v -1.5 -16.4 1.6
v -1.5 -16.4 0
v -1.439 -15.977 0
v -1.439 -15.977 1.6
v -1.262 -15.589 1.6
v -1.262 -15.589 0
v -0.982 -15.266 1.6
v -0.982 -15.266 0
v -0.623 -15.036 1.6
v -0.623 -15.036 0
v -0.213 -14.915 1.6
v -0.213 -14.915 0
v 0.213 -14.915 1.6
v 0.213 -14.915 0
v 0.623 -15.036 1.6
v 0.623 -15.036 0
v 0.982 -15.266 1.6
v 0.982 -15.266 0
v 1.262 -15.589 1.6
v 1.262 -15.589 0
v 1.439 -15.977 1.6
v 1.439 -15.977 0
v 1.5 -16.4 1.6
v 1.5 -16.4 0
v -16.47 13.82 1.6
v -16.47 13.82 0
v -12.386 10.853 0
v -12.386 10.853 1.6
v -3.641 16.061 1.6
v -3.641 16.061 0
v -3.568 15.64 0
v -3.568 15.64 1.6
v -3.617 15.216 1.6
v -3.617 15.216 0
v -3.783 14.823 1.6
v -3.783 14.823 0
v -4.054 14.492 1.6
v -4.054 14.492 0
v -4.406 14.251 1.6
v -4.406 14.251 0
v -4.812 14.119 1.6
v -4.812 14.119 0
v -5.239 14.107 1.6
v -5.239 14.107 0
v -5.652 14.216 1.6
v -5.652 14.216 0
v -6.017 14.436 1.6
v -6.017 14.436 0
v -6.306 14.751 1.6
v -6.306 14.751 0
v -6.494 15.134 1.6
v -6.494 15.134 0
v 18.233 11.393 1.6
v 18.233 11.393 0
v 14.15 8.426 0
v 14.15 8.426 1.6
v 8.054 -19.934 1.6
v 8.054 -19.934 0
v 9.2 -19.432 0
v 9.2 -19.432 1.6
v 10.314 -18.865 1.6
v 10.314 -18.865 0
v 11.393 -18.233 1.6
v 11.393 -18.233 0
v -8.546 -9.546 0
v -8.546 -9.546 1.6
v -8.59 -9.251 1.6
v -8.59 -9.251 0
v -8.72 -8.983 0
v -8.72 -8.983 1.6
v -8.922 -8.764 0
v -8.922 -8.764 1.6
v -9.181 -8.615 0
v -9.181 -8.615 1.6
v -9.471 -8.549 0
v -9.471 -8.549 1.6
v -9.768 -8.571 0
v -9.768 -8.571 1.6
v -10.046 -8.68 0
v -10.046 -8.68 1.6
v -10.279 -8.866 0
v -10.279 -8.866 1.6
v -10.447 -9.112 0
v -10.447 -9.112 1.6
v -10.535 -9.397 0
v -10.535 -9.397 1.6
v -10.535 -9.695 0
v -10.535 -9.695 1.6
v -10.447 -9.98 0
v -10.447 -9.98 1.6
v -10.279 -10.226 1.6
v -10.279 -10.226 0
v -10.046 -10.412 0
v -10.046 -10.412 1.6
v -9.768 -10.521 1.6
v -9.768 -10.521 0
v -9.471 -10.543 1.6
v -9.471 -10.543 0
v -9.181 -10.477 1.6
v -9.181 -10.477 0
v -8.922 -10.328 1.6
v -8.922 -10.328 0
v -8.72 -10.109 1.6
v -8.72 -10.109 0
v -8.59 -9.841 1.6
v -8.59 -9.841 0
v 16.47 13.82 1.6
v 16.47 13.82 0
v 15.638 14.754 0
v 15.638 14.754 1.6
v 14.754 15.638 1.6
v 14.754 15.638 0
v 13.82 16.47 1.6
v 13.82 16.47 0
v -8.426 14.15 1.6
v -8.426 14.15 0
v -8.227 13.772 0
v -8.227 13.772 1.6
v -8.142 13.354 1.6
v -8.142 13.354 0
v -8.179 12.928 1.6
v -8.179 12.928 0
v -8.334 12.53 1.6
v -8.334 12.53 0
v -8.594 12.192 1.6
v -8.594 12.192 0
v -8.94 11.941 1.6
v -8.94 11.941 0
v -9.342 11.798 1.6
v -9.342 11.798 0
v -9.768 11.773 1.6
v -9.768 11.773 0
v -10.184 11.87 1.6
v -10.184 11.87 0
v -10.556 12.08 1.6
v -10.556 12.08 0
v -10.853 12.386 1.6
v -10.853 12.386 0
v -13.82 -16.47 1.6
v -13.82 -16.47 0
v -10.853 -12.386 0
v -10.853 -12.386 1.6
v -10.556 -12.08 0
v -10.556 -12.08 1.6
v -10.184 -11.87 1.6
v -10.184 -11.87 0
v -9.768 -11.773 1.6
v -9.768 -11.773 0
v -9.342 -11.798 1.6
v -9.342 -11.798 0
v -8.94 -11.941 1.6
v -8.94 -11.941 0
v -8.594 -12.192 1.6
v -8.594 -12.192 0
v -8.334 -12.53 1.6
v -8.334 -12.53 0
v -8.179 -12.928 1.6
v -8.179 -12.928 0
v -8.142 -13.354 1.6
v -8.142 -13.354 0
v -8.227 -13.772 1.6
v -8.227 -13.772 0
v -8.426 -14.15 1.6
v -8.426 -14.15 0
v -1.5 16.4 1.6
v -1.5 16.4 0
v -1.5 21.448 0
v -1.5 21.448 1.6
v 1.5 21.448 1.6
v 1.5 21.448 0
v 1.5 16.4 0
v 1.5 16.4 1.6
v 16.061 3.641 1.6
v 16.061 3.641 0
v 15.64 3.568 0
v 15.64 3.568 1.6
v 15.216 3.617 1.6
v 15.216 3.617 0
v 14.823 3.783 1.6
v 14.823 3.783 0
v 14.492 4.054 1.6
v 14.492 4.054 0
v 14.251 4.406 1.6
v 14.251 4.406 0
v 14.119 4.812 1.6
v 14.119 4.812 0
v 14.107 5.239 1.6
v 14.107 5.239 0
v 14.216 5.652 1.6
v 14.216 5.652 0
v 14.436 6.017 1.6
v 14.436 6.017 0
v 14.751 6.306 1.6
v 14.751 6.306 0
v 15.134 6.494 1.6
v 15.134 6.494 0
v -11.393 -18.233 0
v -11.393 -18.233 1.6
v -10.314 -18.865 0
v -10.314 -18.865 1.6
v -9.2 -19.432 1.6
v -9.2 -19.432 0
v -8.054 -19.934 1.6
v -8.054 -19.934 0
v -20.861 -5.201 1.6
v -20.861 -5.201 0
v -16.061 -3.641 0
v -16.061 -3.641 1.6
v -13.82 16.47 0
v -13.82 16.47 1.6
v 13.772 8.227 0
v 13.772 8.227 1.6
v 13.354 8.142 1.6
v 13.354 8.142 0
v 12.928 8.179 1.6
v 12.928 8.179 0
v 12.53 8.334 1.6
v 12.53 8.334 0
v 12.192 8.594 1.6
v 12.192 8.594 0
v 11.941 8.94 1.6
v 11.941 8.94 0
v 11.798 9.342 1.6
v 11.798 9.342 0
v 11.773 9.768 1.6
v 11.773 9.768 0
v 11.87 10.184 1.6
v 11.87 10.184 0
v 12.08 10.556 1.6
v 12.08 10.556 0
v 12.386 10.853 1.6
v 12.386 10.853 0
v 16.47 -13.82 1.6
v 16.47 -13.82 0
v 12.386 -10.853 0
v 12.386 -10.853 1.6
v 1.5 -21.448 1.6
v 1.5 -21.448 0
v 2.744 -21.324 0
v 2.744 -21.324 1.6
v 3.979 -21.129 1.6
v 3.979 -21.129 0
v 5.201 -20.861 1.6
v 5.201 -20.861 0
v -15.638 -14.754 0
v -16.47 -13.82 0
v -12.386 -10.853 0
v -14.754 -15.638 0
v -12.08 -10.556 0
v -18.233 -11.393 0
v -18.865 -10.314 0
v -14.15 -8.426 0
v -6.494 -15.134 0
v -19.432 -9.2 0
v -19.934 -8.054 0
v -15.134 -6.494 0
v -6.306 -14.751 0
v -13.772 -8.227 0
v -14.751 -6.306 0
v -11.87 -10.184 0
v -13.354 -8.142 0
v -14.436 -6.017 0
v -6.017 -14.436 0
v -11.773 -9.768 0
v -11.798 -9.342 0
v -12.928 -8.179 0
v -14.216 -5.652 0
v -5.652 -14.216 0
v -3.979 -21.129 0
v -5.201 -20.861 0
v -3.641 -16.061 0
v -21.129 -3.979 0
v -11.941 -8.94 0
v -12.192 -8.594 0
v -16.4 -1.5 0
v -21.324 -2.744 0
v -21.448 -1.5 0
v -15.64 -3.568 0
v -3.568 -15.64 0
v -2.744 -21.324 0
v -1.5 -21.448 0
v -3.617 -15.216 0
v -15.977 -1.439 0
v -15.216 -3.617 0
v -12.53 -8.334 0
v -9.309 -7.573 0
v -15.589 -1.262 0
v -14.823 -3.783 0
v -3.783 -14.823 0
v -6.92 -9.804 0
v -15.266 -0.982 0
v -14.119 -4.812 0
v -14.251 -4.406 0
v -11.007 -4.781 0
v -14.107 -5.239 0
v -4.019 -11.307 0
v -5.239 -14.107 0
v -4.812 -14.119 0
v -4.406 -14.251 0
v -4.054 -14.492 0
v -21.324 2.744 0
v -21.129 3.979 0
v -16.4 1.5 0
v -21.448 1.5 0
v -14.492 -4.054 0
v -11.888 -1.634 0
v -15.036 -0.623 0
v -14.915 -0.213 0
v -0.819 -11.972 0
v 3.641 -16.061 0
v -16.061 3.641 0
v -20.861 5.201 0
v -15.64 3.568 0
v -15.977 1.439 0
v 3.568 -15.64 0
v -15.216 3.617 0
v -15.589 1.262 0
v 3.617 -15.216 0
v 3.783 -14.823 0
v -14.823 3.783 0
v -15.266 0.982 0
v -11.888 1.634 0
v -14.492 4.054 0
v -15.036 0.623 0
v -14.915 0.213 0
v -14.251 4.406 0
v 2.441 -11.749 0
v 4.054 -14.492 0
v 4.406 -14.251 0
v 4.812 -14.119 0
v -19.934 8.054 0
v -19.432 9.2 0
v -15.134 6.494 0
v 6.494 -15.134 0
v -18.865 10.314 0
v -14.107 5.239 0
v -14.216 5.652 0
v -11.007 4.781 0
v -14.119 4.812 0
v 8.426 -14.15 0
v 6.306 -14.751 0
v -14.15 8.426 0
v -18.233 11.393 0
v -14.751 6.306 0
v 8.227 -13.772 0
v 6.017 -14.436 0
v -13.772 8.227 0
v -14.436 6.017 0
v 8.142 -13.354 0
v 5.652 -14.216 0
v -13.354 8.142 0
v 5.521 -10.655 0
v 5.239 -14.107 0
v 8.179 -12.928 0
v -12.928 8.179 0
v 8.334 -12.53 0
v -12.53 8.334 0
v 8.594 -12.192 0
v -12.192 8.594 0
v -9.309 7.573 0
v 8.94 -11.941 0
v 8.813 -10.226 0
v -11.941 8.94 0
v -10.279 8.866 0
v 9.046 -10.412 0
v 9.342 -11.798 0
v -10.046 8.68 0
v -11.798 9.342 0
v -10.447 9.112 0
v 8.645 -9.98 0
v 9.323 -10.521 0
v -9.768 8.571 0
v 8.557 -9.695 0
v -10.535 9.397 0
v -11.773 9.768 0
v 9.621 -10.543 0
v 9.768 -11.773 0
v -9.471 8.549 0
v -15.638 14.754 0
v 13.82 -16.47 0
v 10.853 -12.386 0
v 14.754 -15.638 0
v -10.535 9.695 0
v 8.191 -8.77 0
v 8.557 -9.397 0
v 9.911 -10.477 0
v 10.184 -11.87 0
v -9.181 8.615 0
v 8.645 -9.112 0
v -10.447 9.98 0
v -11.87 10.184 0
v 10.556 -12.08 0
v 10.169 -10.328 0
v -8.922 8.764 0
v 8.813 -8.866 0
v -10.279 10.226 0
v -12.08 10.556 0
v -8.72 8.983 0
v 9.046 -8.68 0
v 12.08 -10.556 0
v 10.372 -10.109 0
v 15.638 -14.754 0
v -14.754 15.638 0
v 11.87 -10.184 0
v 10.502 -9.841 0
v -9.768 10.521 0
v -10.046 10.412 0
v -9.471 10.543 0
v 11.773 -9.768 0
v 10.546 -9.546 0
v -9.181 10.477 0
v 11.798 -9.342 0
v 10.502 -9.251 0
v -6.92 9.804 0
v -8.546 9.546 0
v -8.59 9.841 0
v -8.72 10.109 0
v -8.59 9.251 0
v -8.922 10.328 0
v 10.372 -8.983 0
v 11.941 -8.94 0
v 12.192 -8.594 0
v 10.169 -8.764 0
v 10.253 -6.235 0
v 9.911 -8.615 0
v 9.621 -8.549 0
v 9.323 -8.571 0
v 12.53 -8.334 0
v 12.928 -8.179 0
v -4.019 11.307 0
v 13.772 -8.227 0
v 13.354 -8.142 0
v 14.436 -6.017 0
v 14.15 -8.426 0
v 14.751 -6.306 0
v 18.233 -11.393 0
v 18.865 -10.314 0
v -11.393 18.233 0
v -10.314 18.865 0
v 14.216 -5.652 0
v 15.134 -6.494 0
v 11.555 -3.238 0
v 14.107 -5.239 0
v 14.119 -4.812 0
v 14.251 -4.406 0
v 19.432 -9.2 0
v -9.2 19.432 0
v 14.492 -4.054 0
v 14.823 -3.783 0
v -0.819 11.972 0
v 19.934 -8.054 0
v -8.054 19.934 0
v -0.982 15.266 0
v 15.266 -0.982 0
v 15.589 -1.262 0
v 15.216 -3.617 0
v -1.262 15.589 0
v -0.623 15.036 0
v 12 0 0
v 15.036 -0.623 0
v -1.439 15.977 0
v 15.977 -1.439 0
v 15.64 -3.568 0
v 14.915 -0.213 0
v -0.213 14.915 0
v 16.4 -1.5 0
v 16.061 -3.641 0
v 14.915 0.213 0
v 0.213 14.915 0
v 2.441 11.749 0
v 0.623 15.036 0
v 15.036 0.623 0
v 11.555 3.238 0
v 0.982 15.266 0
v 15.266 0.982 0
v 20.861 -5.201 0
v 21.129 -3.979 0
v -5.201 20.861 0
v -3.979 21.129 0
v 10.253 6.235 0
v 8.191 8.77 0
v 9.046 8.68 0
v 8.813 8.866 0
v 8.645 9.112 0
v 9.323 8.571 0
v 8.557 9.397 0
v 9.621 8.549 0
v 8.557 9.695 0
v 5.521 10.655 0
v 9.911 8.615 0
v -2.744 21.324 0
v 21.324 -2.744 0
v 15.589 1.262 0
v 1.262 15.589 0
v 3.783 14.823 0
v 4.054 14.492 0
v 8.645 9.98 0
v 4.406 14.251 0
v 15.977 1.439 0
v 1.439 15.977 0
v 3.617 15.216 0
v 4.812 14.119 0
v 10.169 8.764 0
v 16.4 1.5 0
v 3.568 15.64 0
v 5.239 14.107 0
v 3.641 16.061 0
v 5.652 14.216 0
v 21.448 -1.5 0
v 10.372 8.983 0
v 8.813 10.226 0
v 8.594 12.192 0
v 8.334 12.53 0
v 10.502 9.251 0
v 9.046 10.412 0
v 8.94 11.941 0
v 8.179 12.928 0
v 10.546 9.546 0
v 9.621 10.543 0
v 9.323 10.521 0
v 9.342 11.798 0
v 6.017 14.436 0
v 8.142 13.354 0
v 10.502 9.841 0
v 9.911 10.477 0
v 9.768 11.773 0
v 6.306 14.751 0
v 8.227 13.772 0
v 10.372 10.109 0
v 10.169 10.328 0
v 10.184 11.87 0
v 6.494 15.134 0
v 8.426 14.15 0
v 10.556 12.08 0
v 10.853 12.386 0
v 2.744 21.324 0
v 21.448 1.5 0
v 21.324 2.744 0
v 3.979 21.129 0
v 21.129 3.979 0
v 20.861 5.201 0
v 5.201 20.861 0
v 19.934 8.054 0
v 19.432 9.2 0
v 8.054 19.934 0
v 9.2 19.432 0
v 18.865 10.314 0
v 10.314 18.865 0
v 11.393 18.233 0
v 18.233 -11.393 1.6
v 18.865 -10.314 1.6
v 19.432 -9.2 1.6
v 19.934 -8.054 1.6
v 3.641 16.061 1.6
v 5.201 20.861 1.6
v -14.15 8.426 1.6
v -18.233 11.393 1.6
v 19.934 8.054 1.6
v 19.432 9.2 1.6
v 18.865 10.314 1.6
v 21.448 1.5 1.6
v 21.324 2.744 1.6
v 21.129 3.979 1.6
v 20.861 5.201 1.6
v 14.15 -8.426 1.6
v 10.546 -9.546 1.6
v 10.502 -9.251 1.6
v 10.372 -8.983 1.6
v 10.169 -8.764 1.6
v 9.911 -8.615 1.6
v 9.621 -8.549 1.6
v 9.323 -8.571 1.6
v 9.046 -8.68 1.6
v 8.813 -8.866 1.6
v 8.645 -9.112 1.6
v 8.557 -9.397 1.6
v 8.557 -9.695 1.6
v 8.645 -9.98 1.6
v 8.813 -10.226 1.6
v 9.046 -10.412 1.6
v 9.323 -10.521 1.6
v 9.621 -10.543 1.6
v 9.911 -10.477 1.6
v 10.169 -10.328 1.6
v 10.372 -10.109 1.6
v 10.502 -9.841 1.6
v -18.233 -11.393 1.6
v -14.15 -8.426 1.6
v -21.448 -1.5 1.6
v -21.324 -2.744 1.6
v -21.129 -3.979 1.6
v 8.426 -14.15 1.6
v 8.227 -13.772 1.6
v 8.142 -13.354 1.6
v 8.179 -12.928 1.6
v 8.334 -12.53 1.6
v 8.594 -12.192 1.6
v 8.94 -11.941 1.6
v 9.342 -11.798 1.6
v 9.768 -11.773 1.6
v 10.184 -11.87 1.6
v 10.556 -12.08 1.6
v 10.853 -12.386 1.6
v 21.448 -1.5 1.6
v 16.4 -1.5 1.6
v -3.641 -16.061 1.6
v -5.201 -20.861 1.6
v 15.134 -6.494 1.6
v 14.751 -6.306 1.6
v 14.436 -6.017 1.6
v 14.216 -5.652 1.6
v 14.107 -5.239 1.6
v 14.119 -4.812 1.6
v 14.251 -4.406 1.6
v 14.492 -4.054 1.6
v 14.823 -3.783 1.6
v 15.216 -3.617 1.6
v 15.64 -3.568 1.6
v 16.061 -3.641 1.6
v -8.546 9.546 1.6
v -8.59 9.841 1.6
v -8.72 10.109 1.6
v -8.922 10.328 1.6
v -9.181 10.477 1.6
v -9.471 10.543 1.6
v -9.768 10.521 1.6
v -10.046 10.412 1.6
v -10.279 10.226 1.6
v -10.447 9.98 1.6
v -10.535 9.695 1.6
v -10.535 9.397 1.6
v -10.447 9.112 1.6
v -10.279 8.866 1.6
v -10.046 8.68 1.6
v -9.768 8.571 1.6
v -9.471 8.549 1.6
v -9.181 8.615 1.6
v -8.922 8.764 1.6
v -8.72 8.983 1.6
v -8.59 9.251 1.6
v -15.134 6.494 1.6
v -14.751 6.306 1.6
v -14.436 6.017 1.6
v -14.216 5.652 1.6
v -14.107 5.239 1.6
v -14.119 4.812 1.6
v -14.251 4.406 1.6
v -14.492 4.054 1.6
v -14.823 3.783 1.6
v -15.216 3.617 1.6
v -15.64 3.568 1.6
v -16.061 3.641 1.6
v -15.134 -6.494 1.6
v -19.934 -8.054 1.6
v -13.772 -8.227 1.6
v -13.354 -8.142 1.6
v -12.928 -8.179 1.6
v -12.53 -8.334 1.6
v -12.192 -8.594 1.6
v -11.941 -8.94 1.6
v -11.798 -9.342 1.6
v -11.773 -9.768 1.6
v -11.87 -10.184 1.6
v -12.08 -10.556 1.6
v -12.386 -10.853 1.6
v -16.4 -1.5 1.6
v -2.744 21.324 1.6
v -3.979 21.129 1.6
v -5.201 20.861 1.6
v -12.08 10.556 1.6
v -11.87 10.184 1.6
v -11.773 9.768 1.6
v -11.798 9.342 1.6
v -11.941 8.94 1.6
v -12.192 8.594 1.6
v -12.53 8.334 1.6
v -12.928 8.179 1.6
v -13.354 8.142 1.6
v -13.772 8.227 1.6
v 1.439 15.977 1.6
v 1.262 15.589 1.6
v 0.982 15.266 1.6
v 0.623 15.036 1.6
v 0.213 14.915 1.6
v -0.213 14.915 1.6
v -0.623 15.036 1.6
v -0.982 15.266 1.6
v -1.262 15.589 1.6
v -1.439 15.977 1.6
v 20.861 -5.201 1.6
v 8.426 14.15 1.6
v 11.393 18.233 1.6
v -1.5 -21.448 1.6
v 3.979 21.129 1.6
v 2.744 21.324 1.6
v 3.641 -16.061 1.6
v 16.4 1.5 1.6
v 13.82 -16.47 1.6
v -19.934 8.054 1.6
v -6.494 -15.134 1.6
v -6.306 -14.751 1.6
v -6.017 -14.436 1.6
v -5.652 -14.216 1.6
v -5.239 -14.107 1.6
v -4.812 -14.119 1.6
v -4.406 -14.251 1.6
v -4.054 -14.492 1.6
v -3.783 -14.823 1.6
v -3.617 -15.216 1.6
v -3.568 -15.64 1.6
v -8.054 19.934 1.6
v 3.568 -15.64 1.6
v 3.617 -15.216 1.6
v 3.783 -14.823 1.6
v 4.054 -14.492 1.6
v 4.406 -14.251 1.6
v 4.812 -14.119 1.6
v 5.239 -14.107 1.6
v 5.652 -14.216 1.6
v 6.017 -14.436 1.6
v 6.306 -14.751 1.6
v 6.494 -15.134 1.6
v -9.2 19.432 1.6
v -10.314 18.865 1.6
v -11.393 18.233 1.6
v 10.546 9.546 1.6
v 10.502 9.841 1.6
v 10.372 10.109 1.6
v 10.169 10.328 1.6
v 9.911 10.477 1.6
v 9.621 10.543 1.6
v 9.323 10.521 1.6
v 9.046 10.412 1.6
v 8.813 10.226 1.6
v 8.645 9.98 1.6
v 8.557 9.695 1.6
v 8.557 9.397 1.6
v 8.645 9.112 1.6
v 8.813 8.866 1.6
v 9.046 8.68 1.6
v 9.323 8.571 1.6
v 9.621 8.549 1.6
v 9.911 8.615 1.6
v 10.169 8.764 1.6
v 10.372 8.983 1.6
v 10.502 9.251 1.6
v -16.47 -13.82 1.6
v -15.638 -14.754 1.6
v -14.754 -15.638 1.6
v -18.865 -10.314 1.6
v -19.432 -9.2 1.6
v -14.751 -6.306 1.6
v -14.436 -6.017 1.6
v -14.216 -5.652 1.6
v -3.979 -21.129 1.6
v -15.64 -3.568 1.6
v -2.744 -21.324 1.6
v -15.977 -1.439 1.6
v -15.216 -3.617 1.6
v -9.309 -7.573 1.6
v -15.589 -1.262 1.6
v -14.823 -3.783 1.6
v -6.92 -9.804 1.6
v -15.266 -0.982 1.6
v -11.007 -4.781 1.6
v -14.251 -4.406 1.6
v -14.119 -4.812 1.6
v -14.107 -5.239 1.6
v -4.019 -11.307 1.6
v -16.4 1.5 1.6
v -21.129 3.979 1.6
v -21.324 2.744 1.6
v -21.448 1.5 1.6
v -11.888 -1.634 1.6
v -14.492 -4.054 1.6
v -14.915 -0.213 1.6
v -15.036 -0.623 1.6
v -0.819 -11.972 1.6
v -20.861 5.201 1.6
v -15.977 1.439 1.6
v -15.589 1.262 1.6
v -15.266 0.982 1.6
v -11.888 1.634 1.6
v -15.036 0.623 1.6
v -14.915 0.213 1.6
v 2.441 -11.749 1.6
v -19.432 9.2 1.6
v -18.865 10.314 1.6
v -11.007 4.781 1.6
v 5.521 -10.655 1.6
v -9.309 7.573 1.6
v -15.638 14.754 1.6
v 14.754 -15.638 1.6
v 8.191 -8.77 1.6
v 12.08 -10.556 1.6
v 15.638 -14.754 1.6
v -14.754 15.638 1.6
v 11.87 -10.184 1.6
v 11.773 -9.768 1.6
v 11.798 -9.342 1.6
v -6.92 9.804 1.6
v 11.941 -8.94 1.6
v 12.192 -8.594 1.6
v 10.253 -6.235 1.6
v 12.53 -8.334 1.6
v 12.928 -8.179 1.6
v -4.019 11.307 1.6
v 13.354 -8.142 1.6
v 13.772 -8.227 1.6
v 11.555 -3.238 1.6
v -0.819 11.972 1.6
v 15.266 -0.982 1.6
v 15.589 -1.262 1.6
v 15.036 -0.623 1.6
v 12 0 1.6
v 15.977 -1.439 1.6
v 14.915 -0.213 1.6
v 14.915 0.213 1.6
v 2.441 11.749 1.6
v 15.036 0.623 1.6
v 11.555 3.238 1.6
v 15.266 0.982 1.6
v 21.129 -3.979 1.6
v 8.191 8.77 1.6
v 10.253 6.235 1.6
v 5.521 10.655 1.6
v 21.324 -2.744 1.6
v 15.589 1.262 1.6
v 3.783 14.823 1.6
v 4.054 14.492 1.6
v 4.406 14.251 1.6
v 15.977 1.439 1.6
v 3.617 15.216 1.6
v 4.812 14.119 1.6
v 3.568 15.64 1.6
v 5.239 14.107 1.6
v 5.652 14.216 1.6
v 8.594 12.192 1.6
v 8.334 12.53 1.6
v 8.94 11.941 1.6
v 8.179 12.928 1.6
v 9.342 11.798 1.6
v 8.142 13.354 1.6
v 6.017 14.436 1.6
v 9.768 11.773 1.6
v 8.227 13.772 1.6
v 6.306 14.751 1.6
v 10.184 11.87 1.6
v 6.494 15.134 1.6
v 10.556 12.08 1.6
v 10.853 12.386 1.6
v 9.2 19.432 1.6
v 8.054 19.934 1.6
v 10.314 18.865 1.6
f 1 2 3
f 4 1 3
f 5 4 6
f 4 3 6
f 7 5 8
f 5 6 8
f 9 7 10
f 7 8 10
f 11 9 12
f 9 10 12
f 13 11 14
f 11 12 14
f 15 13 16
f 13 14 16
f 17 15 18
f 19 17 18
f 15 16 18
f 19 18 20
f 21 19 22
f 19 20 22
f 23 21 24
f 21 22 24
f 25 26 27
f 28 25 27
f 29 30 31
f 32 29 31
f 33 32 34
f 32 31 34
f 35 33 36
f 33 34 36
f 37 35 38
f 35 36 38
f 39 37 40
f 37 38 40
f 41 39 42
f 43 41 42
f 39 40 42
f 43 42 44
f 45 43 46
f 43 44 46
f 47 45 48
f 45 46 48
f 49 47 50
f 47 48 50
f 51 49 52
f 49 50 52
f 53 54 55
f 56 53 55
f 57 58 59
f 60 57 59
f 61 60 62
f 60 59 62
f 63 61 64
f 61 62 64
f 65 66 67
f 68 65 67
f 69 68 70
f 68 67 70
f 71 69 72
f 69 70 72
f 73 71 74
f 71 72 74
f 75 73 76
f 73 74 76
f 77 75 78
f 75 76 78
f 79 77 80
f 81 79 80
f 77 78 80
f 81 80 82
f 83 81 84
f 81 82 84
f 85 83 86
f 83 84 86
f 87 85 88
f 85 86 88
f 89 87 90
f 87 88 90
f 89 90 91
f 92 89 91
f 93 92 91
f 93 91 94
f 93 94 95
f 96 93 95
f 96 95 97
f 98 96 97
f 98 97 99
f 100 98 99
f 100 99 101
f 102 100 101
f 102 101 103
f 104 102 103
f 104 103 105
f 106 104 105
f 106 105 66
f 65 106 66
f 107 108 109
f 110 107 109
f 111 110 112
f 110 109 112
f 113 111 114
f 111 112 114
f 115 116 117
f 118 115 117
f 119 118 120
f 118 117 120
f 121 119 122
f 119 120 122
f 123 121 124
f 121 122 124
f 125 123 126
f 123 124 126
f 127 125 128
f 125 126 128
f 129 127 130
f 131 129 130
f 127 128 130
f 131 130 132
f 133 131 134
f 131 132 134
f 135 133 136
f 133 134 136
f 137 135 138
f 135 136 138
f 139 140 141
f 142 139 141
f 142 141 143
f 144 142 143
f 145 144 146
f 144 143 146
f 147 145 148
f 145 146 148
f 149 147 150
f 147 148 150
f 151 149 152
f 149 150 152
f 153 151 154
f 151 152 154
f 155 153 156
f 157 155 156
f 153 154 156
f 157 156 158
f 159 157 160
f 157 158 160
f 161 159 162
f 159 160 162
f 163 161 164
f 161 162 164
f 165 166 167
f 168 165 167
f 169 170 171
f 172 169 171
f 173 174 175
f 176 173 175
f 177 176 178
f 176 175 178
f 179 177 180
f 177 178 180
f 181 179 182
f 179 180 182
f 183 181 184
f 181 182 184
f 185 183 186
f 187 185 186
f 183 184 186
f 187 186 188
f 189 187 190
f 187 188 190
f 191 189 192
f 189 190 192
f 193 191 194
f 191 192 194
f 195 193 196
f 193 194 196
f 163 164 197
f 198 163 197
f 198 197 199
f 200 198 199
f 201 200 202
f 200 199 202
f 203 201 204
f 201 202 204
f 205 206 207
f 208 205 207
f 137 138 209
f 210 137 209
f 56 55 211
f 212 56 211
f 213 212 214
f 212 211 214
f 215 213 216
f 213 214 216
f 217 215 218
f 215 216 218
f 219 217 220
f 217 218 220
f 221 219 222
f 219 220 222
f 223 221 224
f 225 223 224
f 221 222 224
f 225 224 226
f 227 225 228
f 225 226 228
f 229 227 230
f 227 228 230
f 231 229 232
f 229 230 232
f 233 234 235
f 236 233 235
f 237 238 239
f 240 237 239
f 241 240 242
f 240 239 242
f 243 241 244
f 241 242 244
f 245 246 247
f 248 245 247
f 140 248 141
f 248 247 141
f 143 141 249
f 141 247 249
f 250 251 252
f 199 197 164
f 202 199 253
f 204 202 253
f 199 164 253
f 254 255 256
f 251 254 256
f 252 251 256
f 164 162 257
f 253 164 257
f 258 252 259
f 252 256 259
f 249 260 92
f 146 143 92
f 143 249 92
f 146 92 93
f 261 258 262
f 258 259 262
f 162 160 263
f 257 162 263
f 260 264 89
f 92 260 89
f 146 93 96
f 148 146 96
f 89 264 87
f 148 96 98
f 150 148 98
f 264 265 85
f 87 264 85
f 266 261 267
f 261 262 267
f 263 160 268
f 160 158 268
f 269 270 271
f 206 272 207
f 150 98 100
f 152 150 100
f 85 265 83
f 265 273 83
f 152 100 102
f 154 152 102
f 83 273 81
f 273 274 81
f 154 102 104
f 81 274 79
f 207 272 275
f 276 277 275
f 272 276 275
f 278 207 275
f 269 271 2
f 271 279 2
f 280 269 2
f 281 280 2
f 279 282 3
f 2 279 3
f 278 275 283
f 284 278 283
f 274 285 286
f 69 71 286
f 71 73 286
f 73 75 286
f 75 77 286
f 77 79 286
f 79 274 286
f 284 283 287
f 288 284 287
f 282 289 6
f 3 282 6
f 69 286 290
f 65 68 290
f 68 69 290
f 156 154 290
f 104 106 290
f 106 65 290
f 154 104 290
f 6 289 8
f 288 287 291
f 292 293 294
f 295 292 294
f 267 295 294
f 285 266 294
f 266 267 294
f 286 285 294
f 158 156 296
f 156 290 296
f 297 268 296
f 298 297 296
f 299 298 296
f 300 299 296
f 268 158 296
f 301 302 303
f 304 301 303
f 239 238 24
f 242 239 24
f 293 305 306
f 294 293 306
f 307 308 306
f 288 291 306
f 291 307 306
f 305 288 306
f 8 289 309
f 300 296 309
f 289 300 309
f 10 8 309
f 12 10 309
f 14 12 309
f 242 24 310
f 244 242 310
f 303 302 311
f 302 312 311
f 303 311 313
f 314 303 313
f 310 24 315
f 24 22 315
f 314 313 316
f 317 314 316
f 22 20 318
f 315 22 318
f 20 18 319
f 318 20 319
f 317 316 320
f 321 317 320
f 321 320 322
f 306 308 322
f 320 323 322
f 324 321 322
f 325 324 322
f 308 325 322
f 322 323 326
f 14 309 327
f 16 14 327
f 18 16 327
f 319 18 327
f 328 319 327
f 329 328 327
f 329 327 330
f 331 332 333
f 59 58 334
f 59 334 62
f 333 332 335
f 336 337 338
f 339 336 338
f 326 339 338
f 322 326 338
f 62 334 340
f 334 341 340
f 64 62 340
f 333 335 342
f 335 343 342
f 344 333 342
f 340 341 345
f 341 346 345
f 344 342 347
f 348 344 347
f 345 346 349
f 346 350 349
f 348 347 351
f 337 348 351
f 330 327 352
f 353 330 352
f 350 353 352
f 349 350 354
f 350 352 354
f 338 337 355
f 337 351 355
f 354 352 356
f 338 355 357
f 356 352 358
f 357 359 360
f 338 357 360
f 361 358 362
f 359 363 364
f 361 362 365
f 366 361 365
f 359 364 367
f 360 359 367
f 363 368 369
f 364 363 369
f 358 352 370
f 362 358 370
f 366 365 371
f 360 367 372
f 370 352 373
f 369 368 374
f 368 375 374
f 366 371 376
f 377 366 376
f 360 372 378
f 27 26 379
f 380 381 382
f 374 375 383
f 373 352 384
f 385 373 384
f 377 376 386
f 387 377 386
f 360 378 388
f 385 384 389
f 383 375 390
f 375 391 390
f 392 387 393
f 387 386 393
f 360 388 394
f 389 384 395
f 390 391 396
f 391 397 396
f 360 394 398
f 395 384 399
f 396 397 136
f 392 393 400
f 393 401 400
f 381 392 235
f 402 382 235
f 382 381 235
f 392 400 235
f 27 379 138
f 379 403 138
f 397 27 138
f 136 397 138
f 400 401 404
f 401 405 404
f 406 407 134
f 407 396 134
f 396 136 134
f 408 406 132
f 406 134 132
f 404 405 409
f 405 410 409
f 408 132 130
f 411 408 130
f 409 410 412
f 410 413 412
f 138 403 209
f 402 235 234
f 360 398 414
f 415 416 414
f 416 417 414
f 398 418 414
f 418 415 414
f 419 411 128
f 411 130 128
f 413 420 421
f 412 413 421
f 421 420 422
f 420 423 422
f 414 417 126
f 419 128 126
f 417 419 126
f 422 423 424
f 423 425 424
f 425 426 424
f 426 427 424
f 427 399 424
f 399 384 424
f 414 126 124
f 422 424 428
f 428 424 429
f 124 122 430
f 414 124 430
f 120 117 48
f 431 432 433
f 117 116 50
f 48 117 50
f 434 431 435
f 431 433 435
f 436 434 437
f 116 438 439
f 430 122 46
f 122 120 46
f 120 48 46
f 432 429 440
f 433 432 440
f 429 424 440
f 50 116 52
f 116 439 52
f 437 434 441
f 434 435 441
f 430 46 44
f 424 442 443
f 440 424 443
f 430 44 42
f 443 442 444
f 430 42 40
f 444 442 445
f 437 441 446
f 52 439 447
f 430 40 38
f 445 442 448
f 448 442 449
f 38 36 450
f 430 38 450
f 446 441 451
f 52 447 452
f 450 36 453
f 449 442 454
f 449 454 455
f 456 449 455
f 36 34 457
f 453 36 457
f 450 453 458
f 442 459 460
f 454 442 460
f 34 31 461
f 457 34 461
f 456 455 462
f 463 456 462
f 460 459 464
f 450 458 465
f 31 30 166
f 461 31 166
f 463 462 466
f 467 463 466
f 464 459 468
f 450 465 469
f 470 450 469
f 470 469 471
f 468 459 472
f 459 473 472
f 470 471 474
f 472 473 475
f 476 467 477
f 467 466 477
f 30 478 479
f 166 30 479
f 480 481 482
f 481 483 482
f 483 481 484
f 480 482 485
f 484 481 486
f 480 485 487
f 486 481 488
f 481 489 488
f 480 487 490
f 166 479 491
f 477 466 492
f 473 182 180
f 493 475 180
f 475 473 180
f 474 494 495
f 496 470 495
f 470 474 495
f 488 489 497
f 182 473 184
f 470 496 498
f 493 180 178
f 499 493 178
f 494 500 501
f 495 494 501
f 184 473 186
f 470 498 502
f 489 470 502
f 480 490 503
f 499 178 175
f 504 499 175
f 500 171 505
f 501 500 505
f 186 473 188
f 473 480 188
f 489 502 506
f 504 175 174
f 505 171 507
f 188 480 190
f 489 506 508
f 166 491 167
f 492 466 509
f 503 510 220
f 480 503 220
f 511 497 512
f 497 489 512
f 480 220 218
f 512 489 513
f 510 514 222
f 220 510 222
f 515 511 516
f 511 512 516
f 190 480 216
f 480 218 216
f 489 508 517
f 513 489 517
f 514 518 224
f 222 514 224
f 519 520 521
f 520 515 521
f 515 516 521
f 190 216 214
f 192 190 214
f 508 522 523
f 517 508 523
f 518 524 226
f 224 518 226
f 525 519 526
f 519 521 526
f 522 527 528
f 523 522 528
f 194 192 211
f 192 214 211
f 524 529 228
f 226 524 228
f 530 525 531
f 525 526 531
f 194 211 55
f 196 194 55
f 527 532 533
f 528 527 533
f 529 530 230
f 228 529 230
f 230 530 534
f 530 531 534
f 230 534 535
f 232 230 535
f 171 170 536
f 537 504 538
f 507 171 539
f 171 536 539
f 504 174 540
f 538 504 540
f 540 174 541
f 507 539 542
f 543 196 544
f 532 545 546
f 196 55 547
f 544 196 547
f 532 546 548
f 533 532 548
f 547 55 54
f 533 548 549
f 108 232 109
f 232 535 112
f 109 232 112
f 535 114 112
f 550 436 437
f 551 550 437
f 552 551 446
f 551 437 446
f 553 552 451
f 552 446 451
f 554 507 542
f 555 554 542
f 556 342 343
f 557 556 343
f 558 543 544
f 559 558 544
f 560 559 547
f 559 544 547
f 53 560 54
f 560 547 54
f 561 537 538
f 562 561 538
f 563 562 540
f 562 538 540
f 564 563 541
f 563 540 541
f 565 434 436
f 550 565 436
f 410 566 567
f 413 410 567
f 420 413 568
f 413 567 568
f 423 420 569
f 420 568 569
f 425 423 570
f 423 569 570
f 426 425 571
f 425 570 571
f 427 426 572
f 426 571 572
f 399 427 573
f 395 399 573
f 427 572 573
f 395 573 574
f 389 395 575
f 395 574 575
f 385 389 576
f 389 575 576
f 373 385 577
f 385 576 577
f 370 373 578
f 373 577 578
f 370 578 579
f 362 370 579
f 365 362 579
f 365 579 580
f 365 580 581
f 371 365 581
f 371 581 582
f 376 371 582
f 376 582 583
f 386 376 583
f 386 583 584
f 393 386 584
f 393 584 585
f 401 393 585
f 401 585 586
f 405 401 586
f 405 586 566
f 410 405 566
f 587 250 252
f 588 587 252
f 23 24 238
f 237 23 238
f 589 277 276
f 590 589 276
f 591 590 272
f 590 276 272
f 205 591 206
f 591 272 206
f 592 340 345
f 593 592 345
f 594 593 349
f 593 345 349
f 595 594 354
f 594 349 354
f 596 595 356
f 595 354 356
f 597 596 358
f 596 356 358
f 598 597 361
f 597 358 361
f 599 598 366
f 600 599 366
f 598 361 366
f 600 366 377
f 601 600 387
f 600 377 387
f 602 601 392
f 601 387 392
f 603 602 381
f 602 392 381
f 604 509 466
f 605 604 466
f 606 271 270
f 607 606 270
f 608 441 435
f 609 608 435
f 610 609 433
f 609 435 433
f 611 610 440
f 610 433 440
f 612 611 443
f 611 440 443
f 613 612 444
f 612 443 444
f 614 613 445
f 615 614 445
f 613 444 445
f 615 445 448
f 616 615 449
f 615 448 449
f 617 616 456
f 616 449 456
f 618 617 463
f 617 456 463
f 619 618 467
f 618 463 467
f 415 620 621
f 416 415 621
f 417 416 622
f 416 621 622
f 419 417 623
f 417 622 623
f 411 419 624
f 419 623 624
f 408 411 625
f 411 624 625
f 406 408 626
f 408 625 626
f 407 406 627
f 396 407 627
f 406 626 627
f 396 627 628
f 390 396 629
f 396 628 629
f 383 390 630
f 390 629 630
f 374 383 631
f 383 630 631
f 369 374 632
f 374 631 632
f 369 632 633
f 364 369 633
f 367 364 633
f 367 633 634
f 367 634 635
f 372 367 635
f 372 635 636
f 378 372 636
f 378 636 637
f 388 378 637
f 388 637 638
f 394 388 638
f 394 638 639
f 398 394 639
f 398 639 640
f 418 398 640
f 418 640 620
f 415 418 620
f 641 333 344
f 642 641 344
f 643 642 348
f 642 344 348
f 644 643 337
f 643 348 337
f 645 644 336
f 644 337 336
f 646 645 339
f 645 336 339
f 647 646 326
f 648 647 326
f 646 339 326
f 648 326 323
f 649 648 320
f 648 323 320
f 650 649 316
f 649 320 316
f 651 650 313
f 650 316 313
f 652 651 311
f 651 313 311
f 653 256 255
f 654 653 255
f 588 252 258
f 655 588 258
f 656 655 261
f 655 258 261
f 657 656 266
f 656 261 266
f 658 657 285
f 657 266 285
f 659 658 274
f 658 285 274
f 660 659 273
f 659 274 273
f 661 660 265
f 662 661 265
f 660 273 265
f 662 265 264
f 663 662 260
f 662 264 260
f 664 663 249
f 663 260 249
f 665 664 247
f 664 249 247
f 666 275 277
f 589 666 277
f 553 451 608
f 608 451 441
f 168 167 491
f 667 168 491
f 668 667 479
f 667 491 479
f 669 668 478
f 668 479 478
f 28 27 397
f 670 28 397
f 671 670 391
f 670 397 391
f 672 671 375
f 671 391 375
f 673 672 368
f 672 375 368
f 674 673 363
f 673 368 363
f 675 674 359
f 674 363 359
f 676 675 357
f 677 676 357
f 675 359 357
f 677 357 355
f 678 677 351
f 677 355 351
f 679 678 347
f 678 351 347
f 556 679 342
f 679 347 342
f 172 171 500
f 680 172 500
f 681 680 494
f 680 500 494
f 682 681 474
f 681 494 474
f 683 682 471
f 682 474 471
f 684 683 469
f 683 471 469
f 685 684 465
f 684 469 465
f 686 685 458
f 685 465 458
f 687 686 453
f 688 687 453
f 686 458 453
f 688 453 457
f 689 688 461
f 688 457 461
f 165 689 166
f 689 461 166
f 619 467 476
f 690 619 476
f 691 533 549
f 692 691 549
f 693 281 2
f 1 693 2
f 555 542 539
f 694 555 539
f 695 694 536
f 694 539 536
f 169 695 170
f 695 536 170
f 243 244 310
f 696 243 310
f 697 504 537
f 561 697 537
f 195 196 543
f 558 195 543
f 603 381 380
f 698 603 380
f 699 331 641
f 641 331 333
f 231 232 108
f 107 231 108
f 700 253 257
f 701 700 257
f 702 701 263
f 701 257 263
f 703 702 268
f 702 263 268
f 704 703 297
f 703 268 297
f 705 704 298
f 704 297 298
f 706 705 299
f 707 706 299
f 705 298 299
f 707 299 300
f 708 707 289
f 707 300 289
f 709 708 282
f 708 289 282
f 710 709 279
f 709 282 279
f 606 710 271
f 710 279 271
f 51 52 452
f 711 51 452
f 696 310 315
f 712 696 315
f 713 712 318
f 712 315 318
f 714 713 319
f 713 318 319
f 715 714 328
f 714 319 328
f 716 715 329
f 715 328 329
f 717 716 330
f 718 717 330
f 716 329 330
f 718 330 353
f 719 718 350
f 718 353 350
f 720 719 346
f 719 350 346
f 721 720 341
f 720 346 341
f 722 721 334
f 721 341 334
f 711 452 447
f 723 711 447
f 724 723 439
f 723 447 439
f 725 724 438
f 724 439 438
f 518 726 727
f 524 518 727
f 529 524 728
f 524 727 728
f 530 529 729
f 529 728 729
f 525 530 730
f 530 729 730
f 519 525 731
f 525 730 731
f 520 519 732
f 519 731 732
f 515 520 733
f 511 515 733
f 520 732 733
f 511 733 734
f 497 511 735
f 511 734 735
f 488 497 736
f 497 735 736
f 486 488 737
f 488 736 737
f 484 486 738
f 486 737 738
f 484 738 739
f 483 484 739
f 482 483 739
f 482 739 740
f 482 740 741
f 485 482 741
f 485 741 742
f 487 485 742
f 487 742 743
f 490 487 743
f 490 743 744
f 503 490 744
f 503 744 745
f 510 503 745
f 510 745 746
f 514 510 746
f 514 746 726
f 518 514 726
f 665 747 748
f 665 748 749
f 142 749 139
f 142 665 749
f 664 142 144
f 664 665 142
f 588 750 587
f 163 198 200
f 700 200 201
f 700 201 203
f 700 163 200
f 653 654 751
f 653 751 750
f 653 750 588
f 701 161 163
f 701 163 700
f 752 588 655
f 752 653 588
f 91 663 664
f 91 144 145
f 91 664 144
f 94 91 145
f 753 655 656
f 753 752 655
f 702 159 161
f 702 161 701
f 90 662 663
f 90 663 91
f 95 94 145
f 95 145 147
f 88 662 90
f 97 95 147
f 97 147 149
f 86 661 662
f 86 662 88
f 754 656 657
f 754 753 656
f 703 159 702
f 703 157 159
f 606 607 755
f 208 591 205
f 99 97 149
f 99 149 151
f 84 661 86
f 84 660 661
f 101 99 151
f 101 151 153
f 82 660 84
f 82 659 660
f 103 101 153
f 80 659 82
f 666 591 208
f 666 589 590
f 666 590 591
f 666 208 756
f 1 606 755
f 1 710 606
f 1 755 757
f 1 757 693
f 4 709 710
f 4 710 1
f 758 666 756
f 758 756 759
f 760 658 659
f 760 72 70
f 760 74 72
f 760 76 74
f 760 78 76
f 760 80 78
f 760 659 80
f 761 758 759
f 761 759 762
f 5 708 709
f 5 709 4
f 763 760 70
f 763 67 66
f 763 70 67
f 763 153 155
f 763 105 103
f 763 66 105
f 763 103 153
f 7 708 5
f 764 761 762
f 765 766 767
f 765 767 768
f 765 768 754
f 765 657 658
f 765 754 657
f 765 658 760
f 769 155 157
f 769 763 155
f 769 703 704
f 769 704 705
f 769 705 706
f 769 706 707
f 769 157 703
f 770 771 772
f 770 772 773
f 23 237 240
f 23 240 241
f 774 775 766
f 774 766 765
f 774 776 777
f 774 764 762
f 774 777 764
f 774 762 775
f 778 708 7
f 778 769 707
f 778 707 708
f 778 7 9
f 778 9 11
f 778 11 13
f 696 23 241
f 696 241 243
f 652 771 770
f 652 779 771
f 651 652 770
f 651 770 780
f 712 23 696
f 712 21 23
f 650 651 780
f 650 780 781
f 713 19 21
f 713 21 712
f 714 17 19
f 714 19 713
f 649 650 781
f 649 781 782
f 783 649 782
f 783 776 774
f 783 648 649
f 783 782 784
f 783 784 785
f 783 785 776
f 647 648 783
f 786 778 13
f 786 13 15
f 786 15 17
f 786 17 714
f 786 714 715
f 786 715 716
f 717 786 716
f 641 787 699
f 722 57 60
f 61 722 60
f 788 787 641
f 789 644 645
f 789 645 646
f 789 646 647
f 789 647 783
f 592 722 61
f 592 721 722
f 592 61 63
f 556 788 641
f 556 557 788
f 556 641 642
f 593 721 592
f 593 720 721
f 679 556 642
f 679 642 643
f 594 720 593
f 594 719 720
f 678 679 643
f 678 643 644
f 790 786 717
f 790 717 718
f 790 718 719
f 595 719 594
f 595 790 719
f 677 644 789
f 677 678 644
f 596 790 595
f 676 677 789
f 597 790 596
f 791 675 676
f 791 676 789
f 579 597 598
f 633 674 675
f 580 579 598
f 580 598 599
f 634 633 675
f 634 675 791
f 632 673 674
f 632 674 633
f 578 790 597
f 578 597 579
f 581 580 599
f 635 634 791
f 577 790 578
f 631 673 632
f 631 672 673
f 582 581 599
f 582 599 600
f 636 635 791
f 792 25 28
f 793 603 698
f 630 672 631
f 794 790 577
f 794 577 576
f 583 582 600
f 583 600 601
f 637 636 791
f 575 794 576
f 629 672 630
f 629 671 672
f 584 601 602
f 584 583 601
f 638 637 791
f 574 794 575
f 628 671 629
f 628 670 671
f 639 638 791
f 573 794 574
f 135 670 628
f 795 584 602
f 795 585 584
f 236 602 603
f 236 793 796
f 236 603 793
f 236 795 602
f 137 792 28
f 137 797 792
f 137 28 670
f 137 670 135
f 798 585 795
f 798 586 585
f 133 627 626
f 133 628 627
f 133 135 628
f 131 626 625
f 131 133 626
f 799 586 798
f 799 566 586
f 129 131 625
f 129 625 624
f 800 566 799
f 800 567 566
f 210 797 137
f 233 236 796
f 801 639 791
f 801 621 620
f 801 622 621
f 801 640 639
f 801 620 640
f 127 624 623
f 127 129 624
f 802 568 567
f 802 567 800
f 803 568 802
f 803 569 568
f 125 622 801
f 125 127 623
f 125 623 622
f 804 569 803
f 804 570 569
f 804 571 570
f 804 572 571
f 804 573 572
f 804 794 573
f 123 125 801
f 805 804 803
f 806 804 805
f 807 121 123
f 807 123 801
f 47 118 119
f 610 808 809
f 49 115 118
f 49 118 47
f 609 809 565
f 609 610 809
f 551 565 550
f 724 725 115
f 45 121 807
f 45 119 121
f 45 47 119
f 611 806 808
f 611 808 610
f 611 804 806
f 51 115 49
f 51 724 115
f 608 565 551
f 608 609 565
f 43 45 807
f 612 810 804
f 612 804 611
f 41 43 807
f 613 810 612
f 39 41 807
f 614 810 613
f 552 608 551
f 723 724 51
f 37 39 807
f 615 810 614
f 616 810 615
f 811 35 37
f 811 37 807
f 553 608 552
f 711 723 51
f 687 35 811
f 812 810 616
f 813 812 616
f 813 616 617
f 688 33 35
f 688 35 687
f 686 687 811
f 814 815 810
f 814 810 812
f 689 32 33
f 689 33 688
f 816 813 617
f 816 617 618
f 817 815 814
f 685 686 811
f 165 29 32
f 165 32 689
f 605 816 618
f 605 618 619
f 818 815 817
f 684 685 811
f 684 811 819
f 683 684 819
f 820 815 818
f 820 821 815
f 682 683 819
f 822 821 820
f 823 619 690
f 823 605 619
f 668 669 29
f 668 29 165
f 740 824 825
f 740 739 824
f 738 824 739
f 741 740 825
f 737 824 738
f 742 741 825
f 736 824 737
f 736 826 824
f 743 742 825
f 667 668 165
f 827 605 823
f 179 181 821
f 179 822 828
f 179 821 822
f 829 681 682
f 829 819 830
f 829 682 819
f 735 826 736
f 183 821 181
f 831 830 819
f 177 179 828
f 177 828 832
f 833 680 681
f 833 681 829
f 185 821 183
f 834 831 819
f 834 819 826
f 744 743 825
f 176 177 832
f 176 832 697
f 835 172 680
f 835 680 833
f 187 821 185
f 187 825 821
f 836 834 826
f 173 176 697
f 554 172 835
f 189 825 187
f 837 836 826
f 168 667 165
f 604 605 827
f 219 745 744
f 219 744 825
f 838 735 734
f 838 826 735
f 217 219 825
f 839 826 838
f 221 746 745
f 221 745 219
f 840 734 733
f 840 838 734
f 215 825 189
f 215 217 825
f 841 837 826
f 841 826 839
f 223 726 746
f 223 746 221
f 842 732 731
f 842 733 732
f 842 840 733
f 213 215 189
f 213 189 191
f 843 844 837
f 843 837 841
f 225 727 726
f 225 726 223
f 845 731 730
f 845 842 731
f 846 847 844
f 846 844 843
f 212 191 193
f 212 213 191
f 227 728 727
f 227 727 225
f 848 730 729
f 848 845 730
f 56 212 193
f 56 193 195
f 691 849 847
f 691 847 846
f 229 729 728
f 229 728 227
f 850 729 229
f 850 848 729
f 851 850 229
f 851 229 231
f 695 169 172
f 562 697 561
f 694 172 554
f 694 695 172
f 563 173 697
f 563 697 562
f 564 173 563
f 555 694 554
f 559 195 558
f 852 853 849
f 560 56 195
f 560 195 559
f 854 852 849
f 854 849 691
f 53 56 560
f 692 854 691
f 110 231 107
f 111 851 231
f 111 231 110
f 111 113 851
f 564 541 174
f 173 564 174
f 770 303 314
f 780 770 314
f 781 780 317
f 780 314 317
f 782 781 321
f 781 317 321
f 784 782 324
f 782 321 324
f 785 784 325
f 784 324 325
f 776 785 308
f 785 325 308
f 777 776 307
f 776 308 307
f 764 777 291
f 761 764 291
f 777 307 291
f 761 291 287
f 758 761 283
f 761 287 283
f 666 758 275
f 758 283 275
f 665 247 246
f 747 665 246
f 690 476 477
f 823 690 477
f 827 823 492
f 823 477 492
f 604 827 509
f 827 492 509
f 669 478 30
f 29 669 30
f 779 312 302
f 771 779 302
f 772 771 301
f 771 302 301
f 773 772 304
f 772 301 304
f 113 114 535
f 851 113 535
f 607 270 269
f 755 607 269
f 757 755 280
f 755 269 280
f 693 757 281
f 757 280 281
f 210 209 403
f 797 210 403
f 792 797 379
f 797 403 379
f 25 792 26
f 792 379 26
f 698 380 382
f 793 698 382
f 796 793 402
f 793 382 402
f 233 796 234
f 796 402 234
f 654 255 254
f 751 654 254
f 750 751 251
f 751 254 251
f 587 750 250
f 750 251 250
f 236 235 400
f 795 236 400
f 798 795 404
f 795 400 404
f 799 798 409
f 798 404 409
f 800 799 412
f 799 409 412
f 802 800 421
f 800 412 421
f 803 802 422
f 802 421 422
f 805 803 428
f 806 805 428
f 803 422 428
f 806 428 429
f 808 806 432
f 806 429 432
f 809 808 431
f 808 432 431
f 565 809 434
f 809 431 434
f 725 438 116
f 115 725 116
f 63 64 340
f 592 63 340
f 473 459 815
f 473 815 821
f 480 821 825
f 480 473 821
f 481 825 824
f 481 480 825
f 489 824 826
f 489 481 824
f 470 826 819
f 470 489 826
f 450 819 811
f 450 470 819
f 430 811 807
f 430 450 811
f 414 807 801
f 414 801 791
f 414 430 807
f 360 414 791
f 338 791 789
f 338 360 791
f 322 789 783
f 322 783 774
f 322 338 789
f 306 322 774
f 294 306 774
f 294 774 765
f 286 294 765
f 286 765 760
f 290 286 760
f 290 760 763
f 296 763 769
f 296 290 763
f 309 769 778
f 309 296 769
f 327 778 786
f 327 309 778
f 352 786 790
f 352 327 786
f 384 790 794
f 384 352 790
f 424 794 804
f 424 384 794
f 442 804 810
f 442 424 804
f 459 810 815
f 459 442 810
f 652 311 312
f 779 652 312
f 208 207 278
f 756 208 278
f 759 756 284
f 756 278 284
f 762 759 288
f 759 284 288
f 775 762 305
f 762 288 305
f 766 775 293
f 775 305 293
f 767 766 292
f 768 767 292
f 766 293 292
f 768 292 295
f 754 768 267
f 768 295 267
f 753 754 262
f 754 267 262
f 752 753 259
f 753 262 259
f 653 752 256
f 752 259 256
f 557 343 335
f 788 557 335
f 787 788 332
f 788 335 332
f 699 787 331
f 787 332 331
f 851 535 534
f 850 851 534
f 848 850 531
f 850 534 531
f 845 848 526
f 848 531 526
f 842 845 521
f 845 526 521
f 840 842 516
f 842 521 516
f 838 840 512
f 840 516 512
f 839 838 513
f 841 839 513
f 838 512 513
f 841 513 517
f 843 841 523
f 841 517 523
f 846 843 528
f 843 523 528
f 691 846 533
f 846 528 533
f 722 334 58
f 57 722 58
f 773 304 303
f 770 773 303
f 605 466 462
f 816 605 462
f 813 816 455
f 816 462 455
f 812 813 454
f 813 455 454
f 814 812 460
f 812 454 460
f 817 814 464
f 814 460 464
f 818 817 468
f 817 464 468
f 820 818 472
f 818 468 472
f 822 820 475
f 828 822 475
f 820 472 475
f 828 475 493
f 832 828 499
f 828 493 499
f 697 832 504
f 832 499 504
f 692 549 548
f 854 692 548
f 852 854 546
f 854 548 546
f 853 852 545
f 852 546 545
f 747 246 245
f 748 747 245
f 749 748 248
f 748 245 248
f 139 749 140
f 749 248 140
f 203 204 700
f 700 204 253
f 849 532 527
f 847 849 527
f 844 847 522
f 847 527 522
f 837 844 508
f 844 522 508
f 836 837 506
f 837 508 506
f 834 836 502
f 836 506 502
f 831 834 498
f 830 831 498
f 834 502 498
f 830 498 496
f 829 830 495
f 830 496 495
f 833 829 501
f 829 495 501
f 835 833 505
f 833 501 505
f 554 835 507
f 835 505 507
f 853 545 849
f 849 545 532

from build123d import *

# Parameters (mm, degrees)
SKETCH1_R           = 12
SKETCH1_R_2         = 1
BOSS_EXTRUDE1_DEPTH = 1.6
SKETCH2_R           = 14.9
SKETCH2_R_2         = 12
BOSS_EXTRUDE2_DEPTH = 1.6
SKETCH3_R           = 1
CUT_EXTRUDE1_DEPTH  = 10


with BuildPart() as part:
    # Sketch1 → Boss-Extrude1 (new body)
    with BuildSketch(Plane.XY):
        with BuildLine():
            Line((-1.5, 16.4), (-1.5, 21.44761059))
            ThreePointArc((-1.5, 21.44761059), (-3.363340998, 21.235299323), (-5.201091386, 20.861415302))
            Line((-5.201091386, 20.861415302), (-3.641293933, 16.060852359))
            ThreePointArc((-3.641293933, 16.060852359), (-4.604353216, 14.170742093), (-6.494463482, 15.133801376))
            Line((-6.494463482, 15.133801376), (-8.054260935, 19.934364319))
            ThreePointArc((-8.054260935, 19.934364319), (-9.760795744, 19.15664027), (-11.39306371, 18.233159334))
            Line((-11.39306371, 18.233159334), (-8.426152646, 14.149556586))
            ThreePointArc((-8.426152646, 14.149556586), (-8.758000259, 12.054353216), (-10.853203629, 12.386200829))
            Line((-10.853203629, 12.386200829), (-13.820114693, 16.469803577))
            ThreePointArc((-13.820114693, 16.469803577), (-15.202795796, 15.202795796), (-16.469803577, 13.820114693))
            Line((-16.469803577, 13.820114693), (-12.386200829, 10.853203629))
            ThreePointArc((-12.386200829, 10.853203629), (-12.054353216, 8.758000259), (-14.149556586, 8.426152646))
            Line((-14.149556586, 8.426152646), (-18.233159334, 11.39306371))
            ThreePointArc((-18.233159334, 11.39306371), (-19.15664027, 9.760795744), (-19.934364319, 8.054260935))
            Line((-19.934364319, 8.054260935), (-15.133801376, 6.494463482))
            ThreePointArc((-15.133801376, 6.494463482), (-14.170742093, 4.604353216), (-16.060852359, 3.641293933))
            Line((-16.060852359, 3.641293933), (-20.861415302, 5.201091386))
            ThreePointArc((-20.861415302, 5.201091386), (-21.235299323, 3.363340998), (-21.44761059, 1.5))
            Line((-21.44761059, 1.5), (-16.4, 1.5))
            ThreePointArc((-16.4, 1.5), (-14.9, 0), (-16.4, -1.5))
            Line((-16.4, -1.5), (-21.44761059, -1.5))
            ThreePointArc((-21.44761059, -1.5), (-21.235299323, -3.363340998), (-20.861415302, -5.201091386))
            Line((-20.861415302, -5.201091386), (-16.060852359, -3.641293933))
            ThreePointArc((-16.060852359, -3.641293933), (-14.170742093, -4.604353216), (-15.133801376, -6.494463482))
            Line((-15.133801376, -6.494463482), (-19.934364319, -8.054260935))
            ThreePointArc((-19.934364319, -8.054260935), (-19.15664027, -9.760795744), (-18.233159334, -11.39306371))
            Line((-18.233159334, -11.39306371), (-14.149556586, -8.426152646))
            ThreePointArc((-14.149556586, -8.426152646), (-12.054353216, -8.758000259), (-12.386200829, -10.853203629))
            Line((-12.386200829, -10.853203629), (-16.469803577, -13.820114693))
            ThreePointArc((-16.469803577, -13.820114693), (-15.202795796, -15.202795796), (-13.820114693, -16.469803577))
            Line((-13.820114693, -16.469803577), (-10.853203629, -12.386200829))
            ThreePointArc((-10.853203629, -12.386200829), (-8.758000259, -12.054353216), (-8.426152646, -14.149556586))
            Line((-8.426152646, -14.149556586), (-11.39306371, -18.233159334))
            ThreePointArc((-11.39306371, -18.233159334), (-9.760795744, -19.15664027), (-8.054260935, -19.934364319))
            Line((-8.054260935, -19.934364319), (-6.494463482, -15.133801376))
            ThreePointArc((-6.494463482, -15.133801376), (-4.604353216, -14.170742093), (-3.641293933, -16.060852359))
            Line((-3.641293933, -16.060852359), (-5.201091386, -20.861415302))
            ThreePointArc((-5.201091386, -20.861415302), (-3.363340998, -21.235299323), (-1.5, -21.44761059))
            Line((-1.5, -21.44761059), (-1.5, -16.4))
            ThreePointArc((-1.5, -16.4), (0, -14.9), (1.5, -16.4))
            Line((1.5, -16.4), (1.5, -21.44761059))
            ThreePointArc((1.5, -21.44761059), (3.363340998, -21.235299323), (5.201091386, -20.861415302))
            Line((5.201091386, -20.861415302), (3.641293933, -16.060852359))
            ThreePointArc((3.641293933, -16.060852359), (4.604353216, -14.170742093), (6.494463482, -15.133801376))
            Line((6.494463482, -15.133801376), (8.054260935, -19.934364319))
            ThreePointArc((8.054260935, -19.934364319), (9.760795744, -19.15664027), (11.39306371, -18.233159334))
            Line((11.39306371, -18.233159334), (8.426152646, -14.149556586))
            ThreePointArc((8.426152646, -14.149556586), (8.758000259, -12.054353216), (10.853203629, -12.386200829))
            Line((10.853203629, -12.386200829), (13.820114693, -16.469803577))
            ThreePointArc((13.820114693, -16.469803577), (15.202795796, -15.202795796), (16.469803577, -13.820114693))
            Line((16.469803577, -13.820114693), (12.386200829, -10.853203629))
            ThreePointArc((12.386200829, -10.853203629), (12.054353216, -8.758000259), (14.149556586, -8.426152646))
            Line((14.149556586, -8.426152646), (18.233159334, -11.39306371))
            ThreePointArc((18.233159334, -11.39306371), (19.15664027, -9.760795744), (19.934364319, -8.054260935))
            Line((19.934364319, -8.054260935), (15.133801376, -6.494463482))
            ThreePointArc((15.133801376, -6.494463482), (14.170742093, -4.604353216), (16.060852359, -3.641293933))
            Line((16.060852359, -3.641293933), (20.861415302, -5.201091386))
            ThreePointArc((20.861415302, -5.201091386), (21.235299323, -3.363340998), (21.44761059, -1.5))
            Line((21.44761059, -1.5), (16.4, -1.5))
            ThreePointArc((16.4, -1.5), (14.9, 0), (16.4, 1.5))
            Line((16.4, 1.5), (21.44761059, 1.5))
            ThreePointArc((21.44761059, 1.5), (21.235299323, 3.363340998), (20.861415302, 5.201091386))
            Line((20.861415302, 5.201091386), (16.060852359, 3.641293933))
            ThreePointArc((16.060852359, 3.641293933), (14.170742093, 4.604353216), (15.133801376, 6.494463482))
            Line((15.133801376, 6.494463482), (19.934364319, 8.054260935))
            ThreePointArc((19.934364319, 8.054260935), (19.15664027, 9.760795744), (18.233159334, 11.39306371))
            Line((18.233159334, 11.39306371), (14.149556586, 8.426152646))
            ThreePointArc((14.149556586, 8.426152646), (12.054353216, 8.758000259), (12.386200829, 10.853203629))
            Line((12.386200829, 10.853203629), (16.469803577, 13.820114693))
            ThreePointArc((16.469803577, 13.820114693), (15.202795796, 15.202795796), (13.820114693, 16.469803577))
            Line((13.820114693, 16.469803577), (10.853203629, 12.386200829))
            ThreePointArc((10.853203629, 12.386200829), (8.758000259, 12.054353216), (8.426152646, 14.149556586))
            Line((8.426152646, 14.149556586), (11.39306371, 18.233159334))
            ThreePointArc((11.39306371, 18.233159334), (9.760795744, 19.15664027), (8.054260935, 19.934364319))
            Line((8.054260935, 19.934364319), (6.494463482, 15.133801376))
            ThreePointArc((6.494463482, 15.133801376), (4.604353216, 14.170742093), (3.641293933, 16.060852359))
            Line((3.641293933, 16.060852359), (5.201091386, 20.861415302))
            ThreePointArc((5.201091386, 20.861415302), (3.363340998, 21.235299323), (1.5, 21.44761059))
            Line((1.5, 21.44761059), (1.5, 16.4))
            ThreePointArc((1.5, 16.4), (0, 14.9), (-1.5, 16.4))
        make_face()
        Circle(SKETCH1_R, mode=Mode.SUBTRACT)
        with Locations((0, 13.5)):
            Circle(SKETCH1_R_2, mode=Mode.SUBTRACT)
        with Locations((13.5, 0)):
            Circle(SKETCH1_R_2, mode=Mode.SUBTRACT)
        with Locations((0, -13.5)):
            Circle(SKETCH1_R_2, mode=Mode.SUBTRACT)
        with Locations((-13.5, 0)):
            Circle(SKETCH1_R_2, mode=Mode.SUBTRACT)
    extrude(amount=BOSS_EXTRUDE1_DEPTH)

    # Sketch2 → Boss-Extrude2 (add)
    with BuildSketch(Plane.XY.offset(1.6)):
        Circle(SKETCH2_R)
        Circle(SKETCH2_R_2, mode=Mode.SUBTRACT)
    extrude(amount=-BOSS_EXTRUDE2_DEPTH)

    # Sketch3 → Cut-Extrude1 (cut)
    with BuildSketch(Plane.XY.offset(1.6)):
        with Locations((9.545941546, 9.545941546)):
            Circle(SKETCH3_R)
        with Locations((9.545941546, -9.545941546)):
            Circle(SKETCH3_R)
        with Locations((-9.545941546, -9.545941546)):
            Circle(SKETCH3_R)
        with Locations((-9.545941546, 9.545941546)):
            Circle(SKETCH3_R)
    extrude(amount=-CUT_EXTRUDE1_DEPTH, mode=Mode.SUBTRACT)


solid = part.part
